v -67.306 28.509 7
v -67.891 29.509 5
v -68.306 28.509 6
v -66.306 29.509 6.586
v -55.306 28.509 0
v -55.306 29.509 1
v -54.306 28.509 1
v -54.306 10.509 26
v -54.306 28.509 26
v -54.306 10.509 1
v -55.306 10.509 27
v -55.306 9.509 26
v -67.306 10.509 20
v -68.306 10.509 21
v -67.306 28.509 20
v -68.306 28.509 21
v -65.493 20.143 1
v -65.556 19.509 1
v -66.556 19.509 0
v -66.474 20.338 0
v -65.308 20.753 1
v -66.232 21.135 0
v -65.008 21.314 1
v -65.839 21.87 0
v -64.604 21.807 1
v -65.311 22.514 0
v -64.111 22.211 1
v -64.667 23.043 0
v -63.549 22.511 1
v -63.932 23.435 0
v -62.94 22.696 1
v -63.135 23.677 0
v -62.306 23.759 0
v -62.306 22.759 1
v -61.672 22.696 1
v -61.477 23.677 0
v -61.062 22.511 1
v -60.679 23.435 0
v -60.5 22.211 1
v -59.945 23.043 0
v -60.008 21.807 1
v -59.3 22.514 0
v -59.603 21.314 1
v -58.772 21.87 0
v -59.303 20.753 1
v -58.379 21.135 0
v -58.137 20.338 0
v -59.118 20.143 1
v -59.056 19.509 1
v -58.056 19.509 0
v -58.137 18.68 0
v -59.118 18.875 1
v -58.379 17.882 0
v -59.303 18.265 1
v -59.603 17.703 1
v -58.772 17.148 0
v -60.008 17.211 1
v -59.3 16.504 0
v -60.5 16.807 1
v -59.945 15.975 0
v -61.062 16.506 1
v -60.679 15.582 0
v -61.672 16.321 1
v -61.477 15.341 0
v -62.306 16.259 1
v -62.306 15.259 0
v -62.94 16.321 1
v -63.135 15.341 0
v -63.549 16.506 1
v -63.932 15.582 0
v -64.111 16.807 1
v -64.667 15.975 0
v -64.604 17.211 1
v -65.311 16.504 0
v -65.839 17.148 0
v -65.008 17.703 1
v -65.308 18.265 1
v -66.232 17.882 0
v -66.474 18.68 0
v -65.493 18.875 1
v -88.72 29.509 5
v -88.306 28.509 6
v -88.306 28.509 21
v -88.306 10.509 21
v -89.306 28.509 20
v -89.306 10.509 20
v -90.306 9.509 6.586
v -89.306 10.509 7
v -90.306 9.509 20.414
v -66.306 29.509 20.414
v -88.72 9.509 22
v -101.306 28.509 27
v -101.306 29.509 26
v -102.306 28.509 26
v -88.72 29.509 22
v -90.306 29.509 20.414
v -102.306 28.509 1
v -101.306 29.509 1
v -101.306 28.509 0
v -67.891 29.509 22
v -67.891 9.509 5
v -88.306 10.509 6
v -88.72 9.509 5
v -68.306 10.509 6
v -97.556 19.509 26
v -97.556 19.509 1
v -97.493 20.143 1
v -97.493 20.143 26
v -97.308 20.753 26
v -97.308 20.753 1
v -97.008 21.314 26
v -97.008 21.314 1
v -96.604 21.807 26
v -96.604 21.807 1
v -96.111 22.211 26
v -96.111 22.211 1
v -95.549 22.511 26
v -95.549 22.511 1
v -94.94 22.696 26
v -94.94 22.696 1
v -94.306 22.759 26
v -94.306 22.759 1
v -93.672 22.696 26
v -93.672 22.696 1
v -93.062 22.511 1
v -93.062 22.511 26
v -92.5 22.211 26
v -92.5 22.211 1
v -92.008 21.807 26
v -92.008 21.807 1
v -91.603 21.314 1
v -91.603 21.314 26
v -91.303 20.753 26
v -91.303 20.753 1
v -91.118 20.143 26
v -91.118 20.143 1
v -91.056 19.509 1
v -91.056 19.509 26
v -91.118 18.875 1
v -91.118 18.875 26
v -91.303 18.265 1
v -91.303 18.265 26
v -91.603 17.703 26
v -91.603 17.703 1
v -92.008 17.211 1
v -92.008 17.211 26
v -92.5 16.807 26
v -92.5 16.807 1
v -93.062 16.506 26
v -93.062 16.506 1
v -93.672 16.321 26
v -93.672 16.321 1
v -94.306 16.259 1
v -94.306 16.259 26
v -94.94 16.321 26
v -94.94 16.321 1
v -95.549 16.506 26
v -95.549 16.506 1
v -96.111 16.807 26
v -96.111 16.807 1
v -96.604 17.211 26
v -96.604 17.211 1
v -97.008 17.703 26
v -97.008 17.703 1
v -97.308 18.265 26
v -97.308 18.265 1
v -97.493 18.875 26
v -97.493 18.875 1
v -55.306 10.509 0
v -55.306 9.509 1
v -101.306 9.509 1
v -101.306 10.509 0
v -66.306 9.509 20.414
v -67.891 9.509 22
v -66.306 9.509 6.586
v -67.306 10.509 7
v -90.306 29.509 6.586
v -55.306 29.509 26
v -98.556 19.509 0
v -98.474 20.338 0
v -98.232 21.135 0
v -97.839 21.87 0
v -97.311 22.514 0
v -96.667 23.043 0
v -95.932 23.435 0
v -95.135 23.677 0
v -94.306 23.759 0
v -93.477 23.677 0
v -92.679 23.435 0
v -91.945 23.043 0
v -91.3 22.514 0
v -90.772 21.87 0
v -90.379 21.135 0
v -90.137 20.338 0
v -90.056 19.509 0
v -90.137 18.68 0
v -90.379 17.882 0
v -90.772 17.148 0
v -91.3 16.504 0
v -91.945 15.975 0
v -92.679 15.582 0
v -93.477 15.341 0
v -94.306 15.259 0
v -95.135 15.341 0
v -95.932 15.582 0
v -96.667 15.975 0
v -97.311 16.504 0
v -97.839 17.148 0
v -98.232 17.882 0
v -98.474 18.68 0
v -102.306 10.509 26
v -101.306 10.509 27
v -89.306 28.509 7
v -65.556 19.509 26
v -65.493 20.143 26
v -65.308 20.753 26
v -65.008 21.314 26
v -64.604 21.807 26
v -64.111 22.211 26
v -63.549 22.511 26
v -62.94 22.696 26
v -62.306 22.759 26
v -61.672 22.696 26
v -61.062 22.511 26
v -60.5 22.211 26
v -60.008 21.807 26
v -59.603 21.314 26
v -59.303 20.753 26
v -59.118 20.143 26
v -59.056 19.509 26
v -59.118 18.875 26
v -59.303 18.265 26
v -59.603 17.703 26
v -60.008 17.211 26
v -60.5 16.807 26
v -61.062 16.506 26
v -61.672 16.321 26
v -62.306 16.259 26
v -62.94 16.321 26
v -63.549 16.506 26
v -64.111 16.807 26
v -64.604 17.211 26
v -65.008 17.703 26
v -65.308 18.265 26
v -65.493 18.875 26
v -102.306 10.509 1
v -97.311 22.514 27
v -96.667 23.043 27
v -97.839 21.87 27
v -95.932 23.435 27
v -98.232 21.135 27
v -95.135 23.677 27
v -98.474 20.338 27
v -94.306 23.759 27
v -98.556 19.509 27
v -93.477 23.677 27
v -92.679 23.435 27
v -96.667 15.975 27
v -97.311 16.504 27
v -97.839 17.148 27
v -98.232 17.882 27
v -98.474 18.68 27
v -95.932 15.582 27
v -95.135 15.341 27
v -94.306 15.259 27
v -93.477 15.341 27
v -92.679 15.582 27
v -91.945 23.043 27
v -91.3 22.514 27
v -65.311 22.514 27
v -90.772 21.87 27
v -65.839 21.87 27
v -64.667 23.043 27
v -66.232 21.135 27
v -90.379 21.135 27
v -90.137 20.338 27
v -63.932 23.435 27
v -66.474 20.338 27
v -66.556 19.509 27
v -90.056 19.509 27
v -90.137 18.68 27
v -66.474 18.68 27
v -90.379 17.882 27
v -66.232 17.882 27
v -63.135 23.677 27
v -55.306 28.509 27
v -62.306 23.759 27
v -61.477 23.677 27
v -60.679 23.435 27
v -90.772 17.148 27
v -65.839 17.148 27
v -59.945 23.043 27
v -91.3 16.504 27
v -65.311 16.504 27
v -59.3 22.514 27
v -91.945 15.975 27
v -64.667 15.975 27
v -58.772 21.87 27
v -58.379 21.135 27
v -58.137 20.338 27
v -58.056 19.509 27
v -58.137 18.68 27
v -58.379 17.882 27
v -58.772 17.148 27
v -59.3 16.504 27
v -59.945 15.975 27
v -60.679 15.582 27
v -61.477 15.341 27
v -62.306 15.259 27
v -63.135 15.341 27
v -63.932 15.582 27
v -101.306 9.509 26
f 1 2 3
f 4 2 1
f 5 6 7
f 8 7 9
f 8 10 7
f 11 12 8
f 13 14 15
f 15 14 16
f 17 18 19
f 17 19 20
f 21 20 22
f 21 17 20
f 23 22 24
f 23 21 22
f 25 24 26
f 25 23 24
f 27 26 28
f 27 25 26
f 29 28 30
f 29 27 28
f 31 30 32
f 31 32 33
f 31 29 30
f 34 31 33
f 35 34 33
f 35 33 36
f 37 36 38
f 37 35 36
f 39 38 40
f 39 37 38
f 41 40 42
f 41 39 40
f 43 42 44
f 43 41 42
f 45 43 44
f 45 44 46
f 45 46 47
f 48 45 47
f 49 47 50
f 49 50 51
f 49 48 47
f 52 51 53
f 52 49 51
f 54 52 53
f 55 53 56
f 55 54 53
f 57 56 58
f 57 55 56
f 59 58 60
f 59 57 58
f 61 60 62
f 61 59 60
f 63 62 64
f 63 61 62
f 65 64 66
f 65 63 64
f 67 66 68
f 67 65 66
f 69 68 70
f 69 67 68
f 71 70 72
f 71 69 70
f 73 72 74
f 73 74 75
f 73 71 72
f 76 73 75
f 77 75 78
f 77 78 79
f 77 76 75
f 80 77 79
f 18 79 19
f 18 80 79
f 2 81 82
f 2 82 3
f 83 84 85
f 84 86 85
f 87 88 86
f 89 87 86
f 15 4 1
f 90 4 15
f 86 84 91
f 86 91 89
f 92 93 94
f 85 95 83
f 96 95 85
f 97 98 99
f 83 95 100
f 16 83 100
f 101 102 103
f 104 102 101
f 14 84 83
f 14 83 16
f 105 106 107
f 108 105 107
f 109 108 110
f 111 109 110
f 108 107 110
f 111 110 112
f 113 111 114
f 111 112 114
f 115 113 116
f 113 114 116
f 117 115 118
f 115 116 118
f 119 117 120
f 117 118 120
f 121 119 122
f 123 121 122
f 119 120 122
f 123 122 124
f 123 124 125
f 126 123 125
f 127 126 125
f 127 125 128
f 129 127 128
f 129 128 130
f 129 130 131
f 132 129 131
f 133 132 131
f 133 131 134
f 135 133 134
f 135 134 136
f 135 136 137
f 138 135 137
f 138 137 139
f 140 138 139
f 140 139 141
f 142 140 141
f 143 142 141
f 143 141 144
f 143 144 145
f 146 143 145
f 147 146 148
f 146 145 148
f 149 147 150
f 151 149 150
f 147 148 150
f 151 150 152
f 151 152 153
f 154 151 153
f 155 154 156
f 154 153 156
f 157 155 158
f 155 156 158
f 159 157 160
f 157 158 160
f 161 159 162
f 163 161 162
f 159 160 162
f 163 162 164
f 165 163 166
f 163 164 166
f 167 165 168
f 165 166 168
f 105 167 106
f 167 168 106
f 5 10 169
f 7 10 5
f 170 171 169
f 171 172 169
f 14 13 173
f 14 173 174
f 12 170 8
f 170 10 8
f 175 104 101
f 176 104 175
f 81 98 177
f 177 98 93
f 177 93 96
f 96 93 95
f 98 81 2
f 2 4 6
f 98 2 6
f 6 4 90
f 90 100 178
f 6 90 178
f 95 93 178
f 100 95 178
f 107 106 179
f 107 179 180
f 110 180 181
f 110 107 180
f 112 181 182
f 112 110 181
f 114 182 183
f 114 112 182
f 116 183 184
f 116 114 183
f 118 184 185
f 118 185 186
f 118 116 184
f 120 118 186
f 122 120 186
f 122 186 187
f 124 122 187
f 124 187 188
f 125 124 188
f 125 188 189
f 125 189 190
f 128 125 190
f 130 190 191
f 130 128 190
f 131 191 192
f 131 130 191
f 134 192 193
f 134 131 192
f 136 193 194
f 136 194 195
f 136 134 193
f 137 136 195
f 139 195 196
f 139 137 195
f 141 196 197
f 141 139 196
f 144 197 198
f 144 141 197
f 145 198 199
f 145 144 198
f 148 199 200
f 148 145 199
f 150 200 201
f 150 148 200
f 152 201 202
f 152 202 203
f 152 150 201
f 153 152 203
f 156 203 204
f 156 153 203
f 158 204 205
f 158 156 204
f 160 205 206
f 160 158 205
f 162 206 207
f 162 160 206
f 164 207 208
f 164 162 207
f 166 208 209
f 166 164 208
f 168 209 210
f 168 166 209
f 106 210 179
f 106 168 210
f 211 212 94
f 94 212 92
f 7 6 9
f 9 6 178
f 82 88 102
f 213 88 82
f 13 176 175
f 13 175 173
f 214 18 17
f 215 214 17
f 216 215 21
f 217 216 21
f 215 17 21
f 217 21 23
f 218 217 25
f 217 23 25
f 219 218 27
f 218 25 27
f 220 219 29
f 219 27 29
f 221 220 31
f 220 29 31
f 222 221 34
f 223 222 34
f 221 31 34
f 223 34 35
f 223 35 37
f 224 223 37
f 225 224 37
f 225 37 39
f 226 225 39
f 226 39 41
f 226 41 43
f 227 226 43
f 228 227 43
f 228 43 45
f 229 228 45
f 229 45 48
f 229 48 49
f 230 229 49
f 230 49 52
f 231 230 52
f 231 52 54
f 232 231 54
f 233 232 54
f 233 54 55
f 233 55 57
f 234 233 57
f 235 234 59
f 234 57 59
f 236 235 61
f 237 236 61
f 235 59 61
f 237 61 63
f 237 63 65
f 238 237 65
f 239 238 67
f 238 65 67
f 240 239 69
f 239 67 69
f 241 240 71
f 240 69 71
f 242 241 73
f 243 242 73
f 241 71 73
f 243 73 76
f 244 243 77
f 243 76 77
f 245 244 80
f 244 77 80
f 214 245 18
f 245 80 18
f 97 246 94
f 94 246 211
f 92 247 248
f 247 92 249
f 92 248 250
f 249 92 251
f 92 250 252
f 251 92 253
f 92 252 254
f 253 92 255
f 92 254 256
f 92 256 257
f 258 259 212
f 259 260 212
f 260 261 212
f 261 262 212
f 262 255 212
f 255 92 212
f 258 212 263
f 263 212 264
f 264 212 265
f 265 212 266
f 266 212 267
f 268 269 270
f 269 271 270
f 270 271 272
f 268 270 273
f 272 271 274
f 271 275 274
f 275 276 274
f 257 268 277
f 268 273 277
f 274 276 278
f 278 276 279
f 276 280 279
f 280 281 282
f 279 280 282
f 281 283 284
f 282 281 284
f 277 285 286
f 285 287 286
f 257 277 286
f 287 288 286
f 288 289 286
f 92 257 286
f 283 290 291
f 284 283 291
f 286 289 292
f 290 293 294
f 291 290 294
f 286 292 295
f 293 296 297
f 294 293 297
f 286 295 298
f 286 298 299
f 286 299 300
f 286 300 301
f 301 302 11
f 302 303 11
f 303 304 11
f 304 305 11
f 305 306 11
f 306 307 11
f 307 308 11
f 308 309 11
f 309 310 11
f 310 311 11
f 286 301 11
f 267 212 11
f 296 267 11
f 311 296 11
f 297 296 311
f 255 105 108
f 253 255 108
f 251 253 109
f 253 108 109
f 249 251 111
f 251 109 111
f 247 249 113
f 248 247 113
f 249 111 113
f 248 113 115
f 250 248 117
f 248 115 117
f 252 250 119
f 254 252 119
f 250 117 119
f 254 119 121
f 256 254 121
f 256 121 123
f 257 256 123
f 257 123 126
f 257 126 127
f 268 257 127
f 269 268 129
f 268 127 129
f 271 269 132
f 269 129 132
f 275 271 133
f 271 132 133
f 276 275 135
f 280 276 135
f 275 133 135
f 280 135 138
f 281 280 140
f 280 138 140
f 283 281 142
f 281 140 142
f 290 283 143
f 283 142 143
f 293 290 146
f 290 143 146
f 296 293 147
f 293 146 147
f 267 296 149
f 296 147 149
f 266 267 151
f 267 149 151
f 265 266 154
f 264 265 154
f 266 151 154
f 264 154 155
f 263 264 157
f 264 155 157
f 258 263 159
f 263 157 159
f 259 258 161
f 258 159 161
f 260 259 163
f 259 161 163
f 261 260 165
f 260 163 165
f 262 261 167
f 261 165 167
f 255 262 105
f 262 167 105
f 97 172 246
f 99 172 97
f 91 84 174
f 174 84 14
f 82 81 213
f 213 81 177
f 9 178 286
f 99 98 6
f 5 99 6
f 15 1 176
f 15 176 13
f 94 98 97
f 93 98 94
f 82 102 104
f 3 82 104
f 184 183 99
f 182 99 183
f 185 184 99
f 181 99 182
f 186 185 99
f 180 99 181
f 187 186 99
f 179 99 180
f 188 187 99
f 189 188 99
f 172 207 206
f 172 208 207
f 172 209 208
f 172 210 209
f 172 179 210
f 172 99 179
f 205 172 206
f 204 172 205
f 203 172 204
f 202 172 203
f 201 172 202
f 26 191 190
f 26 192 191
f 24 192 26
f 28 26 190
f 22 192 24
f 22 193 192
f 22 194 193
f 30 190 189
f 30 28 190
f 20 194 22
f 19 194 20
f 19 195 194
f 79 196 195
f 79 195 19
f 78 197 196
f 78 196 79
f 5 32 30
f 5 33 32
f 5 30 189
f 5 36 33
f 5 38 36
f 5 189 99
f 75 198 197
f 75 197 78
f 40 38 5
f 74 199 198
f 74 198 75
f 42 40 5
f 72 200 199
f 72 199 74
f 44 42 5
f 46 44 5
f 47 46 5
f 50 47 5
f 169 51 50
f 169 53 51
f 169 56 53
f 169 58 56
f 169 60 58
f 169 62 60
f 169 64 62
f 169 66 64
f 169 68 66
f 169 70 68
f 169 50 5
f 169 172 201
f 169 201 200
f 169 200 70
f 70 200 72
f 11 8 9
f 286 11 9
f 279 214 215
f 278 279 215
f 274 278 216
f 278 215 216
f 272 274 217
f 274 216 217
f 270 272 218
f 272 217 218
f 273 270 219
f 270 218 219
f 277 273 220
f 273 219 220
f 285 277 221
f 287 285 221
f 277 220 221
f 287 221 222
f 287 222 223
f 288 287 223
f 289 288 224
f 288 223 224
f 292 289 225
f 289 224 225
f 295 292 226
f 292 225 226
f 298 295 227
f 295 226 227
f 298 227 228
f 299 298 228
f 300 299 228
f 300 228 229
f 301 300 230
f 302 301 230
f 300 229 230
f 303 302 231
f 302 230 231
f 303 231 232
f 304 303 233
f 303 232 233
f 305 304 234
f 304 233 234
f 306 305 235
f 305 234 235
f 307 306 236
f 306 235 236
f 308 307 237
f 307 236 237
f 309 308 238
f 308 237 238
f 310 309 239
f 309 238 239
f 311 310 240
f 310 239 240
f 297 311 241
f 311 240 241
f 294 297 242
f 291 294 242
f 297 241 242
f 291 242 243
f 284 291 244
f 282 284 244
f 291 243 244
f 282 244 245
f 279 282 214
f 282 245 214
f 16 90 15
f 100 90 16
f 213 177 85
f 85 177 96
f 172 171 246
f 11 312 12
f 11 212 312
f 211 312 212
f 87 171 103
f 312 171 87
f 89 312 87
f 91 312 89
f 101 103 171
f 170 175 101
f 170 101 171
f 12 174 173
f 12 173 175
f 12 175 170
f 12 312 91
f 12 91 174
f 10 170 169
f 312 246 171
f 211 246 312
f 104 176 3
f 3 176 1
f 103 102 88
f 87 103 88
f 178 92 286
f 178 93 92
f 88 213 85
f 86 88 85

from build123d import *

# Parameters (mm, degrees)
SKETCH1_W           = 48
SKETCH1_H           = 27
BOSS_EXTRUDE1_DEPTH = 20
SKETCH2_W           = 22
SKETCH2_H           = 15
CUT_EXTRUDE1_DEPTH  = 108.682186993
SKETCH11_R          = 3.25
CUT_EXTRUDE2_DEPTH  = 110.846383385
CHAMFER2_SIZE       = 1
CHAMFER1_SIZE       = 1


with BuildPart() as part:
    # Sketch1 → Boss-Extrude1 (new body)
    with BuildSketch(Plane.XZ.offset(-9.508889291)):
        with Locations((-78.305686037, 13.5)):
            Rectangle(SKETCH1_W, SKETCH1_H)
    extrude(amount=-BOSS_EXTRUDE1_DEPTH)

    # Sketch2 → Cut-Extrude1 (cut, through all)
    with BuildSketch(Plane.XZ.offset(-9.508889291)):
        with Locations((-78.305686037, 13.5)):
            Rectangle(SKETCH2_W, SKETCH2_H)
    extrude(amount=-CUT_EXTRUDE1_DEPTH, mode=Mode.SUBTRACT)

    # Sketch11 → Cut-Extrude2 (cut, through all)
    with BuildSketch(Plane(origin=(0, 0, 0), x_dir=(-1, 0, 0), z_dir=(0, 0, -1))):
        with Locations((94.305686037, 19.508889291)):
            Circle(SKETCH11_R)
        with Locations((62.305686037, 19.508889291)):
            Circle(SKETCH11_R)
    extrude(amount=-CUT_EXTRUDE2_DEPTH, mode=Mode.SUBTRACT)

    # Chamfer2
    chamfer2_edges = [part.edges().sort_by_distance(p)[0] for p in [
        (-89.305686037, 19.508889291, 21),
        (-67.305686037, 19.508889291, 21),
        (-67.305686037, 19.508889291, 6),
        (-89.305686037, 19.508889291, 6),
    ]]
    chamfer(chamfer2_edges, length=CHAMFER2_SIZE)

    # Chamfer1
    chamfer1_edges = [part.edges().sort_by_distance(p)[0] for p in [
        (-54.305686037, 29.508889291, 13.5),
        (-78.305686037, 29.508889291, 27),
        (-91.055686037, 19.508889291, 27),
        (-91.055686037, 19.508889291, 0),
        (-59.055686037, 19.508889291, 27),
        (-59.055686037, 19.508889291, 0),
        (-78.305686037, 9.508889291, 6),
        (-78.305686037, 29.508889291, 6),
        (-89.305686037, 9.508889291, 13.5),
        (-102.305686037, 29.508889291, 13.5),
        (-89.305686037, 29.508889291, 13.5),
        (-67.305686037, 9.508889291, 13.5),
        (-67.305686037, 29.508889291, 13.5),
        (-78.305686037, 9.508889291, 21),
        (-78.305686037, 29.508889291, 21),
        (-78.305686037, 9.508889291, 27),
        (-88.805686037, 9.508889291, 6.5),
        (-88.805686037, 29.508889291, 6.5),
        (-67.805686037, 9.508889291, 6.5),
        (-67.805686037, 29.508889291, 6.5),
        (-67.805686037, 9.508889291, 20.5),
        (-67.805686037, 29.508889291, 20.5),
        (-88.805686037, 9.508889291, 20.5),
        (-54.305686037, 9.508889291, 13.5),
        (-88.805686037, 29.508889291, 20.5),
        (-78.305686037, 9.508889291, 0),
        (-102.305686037, 9.508889291, 13.5),
        (-78.305686037, 29.508889291, 0),
        (-102.305686037, 19.508889291, 27),
        (-54.305686037, 19.508889291, 27),
        (-54.305686037, 19.508889291, 0),
        (-102.305686037, 19.508889291, 0),
    ]]
    chamfer(chamfer1_edges, length=CHAMFER1_SIZE)


solid = part.part
